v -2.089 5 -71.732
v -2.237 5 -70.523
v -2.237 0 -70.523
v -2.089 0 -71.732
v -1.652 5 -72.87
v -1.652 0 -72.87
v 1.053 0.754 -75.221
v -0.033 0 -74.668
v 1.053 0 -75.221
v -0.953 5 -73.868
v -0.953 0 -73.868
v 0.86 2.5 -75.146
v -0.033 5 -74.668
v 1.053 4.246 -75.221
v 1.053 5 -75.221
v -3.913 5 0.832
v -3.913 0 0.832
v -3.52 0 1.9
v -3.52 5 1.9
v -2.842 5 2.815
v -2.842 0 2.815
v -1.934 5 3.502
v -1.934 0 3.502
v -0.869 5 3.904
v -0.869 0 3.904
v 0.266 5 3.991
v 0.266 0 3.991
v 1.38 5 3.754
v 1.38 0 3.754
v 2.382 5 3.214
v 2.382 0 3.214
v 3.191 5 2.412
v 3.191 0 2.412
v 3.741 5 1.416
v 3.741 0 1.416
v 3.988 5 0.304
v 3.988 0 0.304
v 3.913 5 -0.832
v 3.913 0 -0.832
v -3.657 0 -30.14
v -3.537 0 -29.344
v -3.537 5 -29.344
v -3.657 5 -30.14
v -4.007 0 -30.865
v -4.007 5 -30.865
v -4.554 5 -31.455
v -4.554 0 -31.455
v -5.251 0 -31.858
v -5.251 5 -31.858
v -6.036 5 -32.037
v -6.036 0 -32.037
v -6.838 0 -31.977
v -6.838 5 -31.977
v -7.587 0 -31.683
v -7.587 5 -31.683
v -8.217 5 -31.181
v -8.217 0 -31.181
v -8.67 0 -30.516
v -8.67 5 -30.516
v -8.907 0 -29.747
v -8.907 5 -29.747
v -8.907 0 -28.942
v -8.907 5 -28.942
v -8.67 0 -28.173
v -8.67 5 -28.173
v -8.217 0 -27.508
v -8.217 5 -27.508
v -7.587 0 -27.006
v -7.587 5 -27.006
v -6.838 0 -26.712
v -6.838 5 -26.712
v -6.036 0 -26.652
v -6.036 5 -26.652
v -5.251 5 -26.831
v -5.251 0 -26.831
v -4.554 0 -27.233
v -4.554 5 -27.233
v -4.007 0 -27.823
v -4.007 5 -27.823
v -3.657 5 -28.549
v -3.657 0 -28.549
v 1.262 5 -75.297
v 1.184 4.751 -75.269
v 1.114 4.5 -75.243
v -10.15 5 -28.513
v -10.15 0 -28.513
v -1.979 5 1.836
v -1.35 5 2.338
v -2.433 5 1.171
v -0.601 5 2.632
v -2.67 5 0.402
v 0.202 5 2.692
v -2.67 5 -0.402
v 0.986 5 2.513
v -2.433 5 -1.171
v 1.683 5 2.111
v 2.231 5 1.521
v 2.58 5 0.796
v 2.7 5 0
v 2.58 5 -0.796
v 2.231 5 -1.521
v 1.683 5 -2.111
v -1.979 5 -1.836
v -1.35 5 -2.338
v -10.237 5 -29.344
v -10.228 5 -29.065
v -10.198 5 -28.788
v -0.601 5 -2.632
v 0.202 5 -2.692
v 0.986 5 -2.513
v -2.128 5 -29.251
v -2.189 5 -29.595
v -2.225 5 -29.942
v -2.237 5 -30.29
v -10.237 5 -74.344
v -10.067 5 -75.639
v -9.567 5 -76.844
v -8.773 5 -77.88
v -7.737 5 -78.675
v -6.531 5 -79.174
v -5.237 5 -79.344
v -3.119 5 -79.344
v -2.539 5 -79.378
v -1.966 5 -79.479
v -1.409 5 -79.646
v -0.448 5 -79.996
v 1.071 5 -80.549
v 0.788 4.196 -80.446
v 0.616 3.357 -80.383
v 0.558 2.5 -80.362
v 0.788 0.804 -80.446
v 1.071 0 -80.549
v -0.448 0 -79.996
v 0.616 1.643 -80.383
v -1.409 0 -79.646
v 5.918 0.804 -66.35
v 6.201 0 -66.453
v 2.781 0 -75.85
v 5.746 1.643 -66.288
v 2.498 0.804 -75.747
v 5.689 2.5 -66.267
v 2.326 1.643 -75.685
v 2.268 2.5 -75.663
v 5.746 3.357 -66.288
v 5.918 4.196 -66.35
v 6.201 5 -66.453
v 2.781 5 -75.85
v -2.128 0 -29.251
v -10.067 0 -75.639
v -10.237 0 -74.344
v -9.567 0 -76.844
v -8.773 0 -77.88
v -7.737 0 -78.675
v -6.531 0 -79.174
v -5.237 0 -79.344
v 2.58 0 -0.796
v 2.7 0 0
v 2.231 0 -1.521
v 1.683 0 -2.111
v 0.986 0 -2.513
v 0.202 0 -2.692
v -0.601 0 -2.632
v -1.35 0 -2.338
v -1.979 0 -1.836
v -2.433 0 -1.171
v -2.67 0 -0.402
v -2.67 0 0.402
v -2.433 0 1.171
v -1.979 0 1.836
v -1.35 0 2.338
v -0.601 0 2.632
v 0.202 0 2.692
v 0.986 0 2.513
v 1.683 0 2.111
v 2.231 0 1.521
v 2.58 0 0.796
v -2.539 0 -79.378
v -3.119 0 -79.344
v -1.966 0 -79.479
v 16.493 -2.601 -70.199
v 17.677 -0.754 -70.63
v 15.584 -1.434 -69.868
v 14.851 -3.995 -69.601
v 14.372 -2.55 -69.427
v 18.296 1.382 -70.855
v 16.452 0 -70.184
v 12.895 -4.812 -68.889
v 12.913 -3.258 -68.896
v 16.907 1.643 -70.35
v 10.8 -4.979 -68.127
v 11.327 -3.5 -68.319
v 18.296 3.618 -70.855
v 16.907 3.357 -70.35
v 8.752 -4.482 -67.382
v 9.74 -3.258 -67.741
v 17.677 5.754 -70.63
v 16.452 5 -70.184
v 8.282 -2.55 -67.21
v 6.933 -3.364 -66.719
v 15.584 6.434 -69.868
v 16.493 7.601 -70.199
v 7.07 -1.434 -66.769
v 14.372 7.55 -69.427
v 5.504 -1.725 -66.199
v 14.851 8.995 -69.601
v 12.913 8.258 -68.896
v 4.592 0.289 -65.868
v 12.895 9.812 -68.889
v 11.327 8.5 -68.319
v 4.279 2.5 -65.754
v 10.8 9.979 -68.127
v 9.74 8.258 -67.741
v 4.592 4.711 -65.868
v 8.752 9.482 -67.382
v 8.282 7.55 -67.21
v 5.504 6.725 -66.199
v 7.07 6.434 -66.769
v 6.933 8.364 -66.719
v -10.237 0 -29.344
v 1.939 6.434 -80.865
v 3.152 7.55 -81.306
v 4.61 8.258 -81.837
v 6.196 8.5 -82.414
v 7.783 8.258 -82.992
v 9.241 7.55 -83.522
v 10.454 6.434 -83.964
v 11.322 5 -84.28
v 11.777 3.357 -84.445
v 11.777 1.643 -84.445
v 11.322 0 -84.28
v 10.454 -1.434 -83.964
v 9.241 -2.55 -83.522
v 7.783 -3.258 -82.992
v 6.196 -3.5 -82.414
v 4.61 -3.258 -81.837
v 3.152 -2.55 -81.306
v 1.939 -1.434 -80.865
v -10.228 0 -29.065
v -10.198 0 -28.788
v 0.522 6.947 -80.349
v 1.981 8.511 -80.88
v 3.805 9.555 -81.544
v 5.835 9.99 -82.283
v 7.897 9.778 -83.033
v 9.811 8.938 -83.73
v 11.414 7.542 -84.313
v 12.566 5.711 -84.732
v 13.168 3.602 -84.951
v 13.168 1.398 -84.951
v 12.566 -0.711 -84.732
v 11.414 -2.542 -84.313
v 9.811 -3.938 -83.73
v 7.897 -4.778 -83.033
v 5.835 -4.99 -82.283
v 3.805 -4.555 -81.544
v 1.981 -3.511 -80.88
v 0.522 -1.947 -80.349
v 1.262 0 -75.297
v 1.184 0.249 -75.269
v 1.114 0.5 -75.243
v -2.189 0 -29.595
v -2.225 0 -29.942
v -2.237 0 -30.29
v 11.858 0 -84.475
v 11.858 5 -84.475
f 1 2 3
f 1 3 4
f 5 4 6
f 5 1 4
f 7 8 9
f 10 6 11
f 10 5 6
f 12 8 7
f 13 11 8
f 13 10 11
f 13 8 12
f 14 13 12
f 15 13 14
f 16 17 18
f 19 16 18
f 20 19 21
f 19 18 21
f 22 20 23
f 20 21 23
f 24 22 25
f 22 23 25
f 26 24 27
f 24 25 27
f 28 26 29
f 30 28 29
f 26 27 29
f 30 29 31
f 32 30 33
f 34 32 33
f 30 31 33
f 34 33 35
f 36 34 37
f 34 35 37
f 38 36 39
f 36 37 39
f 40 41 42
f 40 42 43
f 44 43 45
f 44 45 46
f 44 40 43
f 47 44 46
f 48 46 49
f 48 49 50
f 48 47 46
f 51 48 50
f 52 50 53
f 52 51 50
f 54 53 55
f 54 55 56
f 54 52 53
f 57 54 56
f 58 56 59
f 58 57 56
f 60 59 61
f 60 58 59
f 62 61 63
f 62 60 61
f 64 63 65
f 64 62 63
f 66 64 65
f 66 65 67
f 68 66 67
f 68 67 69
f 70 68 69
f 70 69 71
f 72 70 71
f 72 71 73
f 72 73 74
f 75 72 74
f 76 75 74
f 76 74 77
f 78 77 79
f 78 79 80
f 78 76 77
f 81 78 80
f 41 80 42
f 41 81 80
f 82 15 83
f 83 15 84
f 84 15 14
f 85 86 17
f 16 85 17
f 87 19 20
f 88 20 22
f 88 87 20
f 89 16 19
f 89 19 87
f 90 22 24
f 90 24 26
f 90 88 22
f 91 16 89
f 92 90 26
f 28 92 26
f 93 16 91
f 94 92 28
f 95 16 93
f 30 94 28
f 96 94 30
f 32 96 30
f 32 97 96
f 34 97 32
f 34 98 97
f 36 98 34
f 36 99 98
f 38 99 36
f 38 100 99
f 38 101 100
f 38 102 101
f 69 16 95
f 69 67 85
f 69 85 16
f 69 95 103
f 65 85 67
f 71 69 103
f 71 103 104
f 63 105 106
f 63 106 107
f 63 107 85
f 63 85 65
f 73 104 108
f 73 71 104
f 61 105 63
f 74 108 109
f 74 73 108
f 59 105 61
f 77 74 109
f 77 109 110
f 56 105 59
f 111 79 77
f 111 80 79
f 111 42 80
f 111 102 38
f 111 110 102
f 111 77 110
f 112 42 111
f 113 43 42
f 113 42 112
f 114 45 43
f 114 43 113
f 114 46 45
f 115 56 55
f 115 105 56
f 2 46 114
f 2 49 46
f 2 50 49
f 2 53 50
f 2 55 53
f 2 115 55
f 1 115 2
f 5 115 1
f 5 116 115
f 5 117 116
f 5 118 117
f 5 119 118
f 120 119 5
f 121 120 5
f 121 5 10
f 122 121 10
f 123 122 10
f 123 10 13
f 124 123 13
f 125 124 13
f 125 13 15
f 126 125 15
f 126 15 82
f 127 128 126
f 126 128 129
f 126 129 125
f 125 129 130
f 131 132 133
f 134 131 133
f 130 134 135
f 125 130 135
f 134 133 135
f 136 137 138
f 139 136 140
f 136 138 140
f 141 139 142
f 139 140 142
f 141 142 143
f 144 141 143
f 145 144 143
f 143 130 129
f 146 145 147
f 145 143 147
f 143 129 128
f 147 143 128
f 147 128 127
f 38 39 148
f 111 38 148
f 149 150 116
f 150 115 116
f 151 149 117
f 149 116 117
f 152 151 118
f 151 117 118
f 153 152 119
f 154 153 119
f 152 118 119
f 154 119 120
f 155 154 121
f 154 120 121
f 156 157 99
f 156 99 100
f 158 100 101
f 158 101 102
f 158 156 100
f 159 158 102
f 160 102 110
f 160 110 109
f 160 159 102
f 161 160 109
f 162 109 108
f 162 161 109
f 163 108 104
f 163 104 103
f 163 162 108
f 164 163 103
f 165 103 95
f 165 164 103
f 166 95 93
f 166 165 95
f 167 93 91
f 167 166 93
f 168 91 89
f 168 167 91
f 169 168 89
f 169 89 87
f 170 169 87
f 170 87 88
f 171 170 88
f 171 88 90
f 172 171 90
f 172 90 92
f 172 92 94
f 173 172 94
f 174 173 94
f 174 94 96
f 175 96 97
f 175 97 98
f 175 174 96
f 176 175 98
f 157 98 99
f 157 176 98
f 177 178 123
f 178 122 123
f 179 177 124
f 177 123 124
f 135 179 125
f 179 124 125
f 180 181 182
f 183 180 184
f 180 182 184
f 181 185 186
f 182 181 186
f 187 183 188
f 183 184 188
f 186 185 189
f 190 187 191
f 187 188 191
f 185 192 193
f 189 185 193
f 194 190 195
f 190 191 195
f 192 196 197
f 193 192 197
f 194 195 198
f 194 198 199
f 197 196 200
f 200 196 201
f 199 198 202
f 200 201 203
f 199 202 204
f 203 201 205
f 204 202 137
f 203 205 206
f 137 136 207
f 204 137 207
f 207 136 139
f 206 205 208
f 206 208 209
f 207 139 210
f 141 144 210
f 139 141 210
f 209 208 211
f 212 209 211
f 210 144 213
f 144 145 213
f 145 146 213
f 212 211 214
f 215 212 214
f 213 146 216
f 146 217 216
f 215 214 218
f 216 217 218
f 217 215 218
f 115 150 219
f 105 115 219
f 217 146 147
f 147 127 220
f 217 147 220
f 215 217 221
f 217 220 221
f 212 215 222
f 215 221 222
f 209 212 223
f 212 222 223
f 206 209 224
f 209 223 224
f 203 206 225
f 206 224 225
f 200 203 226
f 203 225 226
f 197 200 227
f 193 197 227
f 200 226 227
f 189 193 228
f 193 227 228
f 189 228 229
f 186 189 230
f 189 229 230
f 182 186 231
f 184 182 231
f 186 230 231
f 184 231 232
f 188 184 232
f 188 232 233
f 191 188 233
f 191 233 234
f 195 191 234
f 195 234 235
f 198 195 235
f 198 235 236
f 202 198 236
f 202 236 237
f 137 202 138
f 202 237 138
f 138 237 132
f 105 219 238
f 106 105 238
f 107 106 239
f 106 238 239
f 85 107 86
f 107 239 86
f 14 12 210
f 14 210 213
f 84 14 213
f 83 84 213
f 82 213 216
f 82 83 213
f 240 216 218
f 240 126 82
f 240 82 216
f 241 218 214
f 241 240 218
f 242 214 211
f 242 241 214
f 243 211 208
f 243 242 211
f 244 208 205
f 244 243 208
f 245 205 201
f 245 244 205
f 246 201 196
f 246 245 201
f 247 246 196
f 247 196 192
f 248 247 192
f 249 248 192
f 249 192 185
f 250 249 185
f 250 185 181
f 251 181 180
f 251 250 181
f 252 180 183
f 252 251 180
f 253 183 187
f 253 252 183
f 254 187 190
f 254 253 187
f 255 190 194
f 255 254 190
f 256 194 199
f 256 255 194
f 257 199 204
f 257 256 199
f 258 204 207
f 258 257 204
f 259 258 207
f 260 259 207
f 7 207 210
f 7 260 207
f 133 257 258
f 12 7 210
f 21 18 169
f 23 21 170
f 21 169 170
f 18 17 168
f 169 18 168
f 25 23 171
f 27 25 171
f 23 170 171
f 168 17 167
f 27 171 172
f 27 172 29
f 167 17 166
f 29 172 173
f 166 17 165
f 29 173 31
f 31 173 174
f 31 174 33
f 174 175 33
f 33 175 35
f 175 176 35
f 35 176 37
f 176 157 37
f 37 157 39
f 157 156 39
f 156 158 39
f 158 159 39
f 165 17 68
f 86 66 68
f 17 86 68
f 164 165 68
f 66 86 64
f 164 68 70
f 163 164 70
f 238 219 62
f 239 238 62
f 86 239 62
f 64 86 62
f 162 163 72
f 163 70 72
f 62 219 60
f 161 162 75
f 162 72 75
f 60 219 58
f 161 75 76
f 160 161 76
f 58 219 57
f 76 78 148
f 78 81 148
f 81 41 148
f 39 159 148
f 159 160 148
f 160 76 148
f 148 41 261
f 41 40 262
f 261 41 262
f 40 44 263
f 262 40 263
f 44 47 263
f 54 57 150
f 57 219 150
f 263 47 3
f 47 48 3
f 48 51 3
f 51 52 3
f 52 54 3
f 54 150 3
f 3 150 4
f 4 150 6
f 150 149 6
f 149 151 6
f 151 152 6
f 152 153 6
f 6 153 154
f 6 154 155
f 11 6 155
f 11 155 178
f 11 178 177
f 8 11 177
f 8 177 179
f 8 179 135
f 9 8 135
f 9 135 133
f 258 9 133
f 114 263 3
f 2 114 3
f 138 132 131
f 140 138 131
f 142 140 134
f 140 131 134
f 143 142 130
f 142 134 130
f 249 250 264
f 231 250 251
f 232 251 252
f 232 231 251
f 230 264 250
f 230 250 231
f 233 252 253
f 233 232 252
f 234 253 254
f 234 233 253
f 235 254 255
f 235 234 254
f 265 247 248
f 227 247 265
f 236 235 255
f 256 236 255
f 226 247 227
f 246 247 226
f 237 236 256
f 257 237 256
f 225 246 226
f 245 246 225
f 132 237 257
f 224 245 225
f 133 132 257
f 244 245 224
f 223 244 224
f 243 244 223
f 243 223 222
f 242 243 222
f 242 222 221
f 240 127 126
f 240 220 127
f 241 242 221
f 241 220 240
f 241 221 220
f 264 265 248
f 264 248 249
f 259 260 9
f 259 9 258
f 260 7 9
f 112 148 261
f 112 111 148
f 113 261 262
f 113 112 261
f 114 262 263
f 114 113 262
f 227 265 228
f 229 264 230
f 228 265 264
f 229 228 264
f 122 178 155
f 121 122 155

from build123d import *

# Parameters (mm, degrees)
SKETCH1_R           = 2.7
BOSS_EXTRUDE2_DEPTH = 5
FILLET2_R           = 5
SKETCH2_R           = 7.5
SKETCH2_R_2         = 6
BOSS_EXTRUDE3_DEPTH = 15
CUT_EXTRUDE1_DEPTH  = 15


with BuildPart() as part:
    # Sketch1 → Boss-Extrude2 (new body)
    with BuildSketch(Plane(origin=(0, 0, 0), x_dir=(1, 0, 0), z_dir=(0, 1, 0))):
        with BuildLine():
            Line((-10.149941127, 28.512781259), (-3.912590403, -0.831646763))
            ThreePointArc((-3.912590403, -0.831646763), (0.831646763, -3.912590403), (3.912590403, 0.831646763))
            Line((3.912590403, 0.831646763), (-2.237350725, 29.764844963))
            Line((-2.237350725, 29.764844963), (-2.237350725, 74.02353916))
            Line((-2.237350725, 74.02353916), (13.568139304, 79.776267068))
            Line((13.568139304, 79.776267068), (11.858038587, 84.474730172))
            Line((11.858038587, 84.474730172), (-2.237350725, 79.344428022))
            Line((-2.237350725, 79.344428022), (-10.237350725, 79.344428022))
            Line((-10.237350725, 79.344428022), (-10.237350725, 29.344428022))
            ThreePointArc((-10.237350725, 29.344428022), (-10.215438306, 28.926314169), (-10.149941127, 28.512781259))
        make_face()
        with Locations((-6.237350725, 29.344428022)):
            Circle(SKETCH1_R, mode=Mode.SUBTRACT)
        Circle(SKETCH1_R, mode=Mode.SUBTRACT)
    extrude(amount=BOSS_EXTRUDE2_DEPTH)

    # Fillet2
    fillet2_edges = [part.edges().sort_by_distance(p)[0] for p in [
        (-2.237350725, 2.5, -79.344428022),
        (-10.237350725, 2.5, -79.344428022),
        (-2.237350725, 2.5, -74.02353916),
        (-2.237350725, 2.5, -29.764844963),
    ]]
    fillet(fillet2_edges, radius=FILLET2_R)

    # Sketch2 → Boss-Extrude3 (add)
    with BuildSketch(Plane(origin=(-25.762527932, 0, -70.781963762), x_dir=(-0.9396926207859105, 0, 0.3420201433256629), z_dir=(-0.34202014332566294, 0, -0.9396926207859106))):
        with Locations((-34.010040431, 2.5)):
            Circle(SKETCH2_R)
        with Locations((-34.010040431, 2.5)):
            Circle(SKETCH2_R_2, mode=Mode.SUBTRACT)
    extrude(amount=-BOSS_EXTRUDE3_DEPTH)

    # Sketch2<2> → Cut-Extrude1 (cut)
    with BuildSketch(Plane(origin=(-25.762527932, 0, -70.781963762), x_dir=(-0.9396926207859105, 0, 0.3420201433256629), z_dir=(-0.34202014332566294, 0, -0.9396926207859106))):
        with BuildLine():
            ThreePointArc((-28.010040431, 2.5), (-28.148038369, 3.779426367), (-28.555684374, 5))
            Line((-28.555684374, 5), (-39.464396489, 5))
            ThreePointArc((-39.464396489, 5), (-40.010040431, 2.5), (-39.464396489, 0))
            Line((-39.464396489, 0), (-28.555684374, 0))
            ThreePointArc((-28.555684374, 0), (-28.148038369, 1.220573633), (-28.010040431, 2.5))
        make_face()
    extrude(amount=-CUT_EXTRUDE1_DEPTH, mode=Mode.SUBTRACT)


solid = part.part
